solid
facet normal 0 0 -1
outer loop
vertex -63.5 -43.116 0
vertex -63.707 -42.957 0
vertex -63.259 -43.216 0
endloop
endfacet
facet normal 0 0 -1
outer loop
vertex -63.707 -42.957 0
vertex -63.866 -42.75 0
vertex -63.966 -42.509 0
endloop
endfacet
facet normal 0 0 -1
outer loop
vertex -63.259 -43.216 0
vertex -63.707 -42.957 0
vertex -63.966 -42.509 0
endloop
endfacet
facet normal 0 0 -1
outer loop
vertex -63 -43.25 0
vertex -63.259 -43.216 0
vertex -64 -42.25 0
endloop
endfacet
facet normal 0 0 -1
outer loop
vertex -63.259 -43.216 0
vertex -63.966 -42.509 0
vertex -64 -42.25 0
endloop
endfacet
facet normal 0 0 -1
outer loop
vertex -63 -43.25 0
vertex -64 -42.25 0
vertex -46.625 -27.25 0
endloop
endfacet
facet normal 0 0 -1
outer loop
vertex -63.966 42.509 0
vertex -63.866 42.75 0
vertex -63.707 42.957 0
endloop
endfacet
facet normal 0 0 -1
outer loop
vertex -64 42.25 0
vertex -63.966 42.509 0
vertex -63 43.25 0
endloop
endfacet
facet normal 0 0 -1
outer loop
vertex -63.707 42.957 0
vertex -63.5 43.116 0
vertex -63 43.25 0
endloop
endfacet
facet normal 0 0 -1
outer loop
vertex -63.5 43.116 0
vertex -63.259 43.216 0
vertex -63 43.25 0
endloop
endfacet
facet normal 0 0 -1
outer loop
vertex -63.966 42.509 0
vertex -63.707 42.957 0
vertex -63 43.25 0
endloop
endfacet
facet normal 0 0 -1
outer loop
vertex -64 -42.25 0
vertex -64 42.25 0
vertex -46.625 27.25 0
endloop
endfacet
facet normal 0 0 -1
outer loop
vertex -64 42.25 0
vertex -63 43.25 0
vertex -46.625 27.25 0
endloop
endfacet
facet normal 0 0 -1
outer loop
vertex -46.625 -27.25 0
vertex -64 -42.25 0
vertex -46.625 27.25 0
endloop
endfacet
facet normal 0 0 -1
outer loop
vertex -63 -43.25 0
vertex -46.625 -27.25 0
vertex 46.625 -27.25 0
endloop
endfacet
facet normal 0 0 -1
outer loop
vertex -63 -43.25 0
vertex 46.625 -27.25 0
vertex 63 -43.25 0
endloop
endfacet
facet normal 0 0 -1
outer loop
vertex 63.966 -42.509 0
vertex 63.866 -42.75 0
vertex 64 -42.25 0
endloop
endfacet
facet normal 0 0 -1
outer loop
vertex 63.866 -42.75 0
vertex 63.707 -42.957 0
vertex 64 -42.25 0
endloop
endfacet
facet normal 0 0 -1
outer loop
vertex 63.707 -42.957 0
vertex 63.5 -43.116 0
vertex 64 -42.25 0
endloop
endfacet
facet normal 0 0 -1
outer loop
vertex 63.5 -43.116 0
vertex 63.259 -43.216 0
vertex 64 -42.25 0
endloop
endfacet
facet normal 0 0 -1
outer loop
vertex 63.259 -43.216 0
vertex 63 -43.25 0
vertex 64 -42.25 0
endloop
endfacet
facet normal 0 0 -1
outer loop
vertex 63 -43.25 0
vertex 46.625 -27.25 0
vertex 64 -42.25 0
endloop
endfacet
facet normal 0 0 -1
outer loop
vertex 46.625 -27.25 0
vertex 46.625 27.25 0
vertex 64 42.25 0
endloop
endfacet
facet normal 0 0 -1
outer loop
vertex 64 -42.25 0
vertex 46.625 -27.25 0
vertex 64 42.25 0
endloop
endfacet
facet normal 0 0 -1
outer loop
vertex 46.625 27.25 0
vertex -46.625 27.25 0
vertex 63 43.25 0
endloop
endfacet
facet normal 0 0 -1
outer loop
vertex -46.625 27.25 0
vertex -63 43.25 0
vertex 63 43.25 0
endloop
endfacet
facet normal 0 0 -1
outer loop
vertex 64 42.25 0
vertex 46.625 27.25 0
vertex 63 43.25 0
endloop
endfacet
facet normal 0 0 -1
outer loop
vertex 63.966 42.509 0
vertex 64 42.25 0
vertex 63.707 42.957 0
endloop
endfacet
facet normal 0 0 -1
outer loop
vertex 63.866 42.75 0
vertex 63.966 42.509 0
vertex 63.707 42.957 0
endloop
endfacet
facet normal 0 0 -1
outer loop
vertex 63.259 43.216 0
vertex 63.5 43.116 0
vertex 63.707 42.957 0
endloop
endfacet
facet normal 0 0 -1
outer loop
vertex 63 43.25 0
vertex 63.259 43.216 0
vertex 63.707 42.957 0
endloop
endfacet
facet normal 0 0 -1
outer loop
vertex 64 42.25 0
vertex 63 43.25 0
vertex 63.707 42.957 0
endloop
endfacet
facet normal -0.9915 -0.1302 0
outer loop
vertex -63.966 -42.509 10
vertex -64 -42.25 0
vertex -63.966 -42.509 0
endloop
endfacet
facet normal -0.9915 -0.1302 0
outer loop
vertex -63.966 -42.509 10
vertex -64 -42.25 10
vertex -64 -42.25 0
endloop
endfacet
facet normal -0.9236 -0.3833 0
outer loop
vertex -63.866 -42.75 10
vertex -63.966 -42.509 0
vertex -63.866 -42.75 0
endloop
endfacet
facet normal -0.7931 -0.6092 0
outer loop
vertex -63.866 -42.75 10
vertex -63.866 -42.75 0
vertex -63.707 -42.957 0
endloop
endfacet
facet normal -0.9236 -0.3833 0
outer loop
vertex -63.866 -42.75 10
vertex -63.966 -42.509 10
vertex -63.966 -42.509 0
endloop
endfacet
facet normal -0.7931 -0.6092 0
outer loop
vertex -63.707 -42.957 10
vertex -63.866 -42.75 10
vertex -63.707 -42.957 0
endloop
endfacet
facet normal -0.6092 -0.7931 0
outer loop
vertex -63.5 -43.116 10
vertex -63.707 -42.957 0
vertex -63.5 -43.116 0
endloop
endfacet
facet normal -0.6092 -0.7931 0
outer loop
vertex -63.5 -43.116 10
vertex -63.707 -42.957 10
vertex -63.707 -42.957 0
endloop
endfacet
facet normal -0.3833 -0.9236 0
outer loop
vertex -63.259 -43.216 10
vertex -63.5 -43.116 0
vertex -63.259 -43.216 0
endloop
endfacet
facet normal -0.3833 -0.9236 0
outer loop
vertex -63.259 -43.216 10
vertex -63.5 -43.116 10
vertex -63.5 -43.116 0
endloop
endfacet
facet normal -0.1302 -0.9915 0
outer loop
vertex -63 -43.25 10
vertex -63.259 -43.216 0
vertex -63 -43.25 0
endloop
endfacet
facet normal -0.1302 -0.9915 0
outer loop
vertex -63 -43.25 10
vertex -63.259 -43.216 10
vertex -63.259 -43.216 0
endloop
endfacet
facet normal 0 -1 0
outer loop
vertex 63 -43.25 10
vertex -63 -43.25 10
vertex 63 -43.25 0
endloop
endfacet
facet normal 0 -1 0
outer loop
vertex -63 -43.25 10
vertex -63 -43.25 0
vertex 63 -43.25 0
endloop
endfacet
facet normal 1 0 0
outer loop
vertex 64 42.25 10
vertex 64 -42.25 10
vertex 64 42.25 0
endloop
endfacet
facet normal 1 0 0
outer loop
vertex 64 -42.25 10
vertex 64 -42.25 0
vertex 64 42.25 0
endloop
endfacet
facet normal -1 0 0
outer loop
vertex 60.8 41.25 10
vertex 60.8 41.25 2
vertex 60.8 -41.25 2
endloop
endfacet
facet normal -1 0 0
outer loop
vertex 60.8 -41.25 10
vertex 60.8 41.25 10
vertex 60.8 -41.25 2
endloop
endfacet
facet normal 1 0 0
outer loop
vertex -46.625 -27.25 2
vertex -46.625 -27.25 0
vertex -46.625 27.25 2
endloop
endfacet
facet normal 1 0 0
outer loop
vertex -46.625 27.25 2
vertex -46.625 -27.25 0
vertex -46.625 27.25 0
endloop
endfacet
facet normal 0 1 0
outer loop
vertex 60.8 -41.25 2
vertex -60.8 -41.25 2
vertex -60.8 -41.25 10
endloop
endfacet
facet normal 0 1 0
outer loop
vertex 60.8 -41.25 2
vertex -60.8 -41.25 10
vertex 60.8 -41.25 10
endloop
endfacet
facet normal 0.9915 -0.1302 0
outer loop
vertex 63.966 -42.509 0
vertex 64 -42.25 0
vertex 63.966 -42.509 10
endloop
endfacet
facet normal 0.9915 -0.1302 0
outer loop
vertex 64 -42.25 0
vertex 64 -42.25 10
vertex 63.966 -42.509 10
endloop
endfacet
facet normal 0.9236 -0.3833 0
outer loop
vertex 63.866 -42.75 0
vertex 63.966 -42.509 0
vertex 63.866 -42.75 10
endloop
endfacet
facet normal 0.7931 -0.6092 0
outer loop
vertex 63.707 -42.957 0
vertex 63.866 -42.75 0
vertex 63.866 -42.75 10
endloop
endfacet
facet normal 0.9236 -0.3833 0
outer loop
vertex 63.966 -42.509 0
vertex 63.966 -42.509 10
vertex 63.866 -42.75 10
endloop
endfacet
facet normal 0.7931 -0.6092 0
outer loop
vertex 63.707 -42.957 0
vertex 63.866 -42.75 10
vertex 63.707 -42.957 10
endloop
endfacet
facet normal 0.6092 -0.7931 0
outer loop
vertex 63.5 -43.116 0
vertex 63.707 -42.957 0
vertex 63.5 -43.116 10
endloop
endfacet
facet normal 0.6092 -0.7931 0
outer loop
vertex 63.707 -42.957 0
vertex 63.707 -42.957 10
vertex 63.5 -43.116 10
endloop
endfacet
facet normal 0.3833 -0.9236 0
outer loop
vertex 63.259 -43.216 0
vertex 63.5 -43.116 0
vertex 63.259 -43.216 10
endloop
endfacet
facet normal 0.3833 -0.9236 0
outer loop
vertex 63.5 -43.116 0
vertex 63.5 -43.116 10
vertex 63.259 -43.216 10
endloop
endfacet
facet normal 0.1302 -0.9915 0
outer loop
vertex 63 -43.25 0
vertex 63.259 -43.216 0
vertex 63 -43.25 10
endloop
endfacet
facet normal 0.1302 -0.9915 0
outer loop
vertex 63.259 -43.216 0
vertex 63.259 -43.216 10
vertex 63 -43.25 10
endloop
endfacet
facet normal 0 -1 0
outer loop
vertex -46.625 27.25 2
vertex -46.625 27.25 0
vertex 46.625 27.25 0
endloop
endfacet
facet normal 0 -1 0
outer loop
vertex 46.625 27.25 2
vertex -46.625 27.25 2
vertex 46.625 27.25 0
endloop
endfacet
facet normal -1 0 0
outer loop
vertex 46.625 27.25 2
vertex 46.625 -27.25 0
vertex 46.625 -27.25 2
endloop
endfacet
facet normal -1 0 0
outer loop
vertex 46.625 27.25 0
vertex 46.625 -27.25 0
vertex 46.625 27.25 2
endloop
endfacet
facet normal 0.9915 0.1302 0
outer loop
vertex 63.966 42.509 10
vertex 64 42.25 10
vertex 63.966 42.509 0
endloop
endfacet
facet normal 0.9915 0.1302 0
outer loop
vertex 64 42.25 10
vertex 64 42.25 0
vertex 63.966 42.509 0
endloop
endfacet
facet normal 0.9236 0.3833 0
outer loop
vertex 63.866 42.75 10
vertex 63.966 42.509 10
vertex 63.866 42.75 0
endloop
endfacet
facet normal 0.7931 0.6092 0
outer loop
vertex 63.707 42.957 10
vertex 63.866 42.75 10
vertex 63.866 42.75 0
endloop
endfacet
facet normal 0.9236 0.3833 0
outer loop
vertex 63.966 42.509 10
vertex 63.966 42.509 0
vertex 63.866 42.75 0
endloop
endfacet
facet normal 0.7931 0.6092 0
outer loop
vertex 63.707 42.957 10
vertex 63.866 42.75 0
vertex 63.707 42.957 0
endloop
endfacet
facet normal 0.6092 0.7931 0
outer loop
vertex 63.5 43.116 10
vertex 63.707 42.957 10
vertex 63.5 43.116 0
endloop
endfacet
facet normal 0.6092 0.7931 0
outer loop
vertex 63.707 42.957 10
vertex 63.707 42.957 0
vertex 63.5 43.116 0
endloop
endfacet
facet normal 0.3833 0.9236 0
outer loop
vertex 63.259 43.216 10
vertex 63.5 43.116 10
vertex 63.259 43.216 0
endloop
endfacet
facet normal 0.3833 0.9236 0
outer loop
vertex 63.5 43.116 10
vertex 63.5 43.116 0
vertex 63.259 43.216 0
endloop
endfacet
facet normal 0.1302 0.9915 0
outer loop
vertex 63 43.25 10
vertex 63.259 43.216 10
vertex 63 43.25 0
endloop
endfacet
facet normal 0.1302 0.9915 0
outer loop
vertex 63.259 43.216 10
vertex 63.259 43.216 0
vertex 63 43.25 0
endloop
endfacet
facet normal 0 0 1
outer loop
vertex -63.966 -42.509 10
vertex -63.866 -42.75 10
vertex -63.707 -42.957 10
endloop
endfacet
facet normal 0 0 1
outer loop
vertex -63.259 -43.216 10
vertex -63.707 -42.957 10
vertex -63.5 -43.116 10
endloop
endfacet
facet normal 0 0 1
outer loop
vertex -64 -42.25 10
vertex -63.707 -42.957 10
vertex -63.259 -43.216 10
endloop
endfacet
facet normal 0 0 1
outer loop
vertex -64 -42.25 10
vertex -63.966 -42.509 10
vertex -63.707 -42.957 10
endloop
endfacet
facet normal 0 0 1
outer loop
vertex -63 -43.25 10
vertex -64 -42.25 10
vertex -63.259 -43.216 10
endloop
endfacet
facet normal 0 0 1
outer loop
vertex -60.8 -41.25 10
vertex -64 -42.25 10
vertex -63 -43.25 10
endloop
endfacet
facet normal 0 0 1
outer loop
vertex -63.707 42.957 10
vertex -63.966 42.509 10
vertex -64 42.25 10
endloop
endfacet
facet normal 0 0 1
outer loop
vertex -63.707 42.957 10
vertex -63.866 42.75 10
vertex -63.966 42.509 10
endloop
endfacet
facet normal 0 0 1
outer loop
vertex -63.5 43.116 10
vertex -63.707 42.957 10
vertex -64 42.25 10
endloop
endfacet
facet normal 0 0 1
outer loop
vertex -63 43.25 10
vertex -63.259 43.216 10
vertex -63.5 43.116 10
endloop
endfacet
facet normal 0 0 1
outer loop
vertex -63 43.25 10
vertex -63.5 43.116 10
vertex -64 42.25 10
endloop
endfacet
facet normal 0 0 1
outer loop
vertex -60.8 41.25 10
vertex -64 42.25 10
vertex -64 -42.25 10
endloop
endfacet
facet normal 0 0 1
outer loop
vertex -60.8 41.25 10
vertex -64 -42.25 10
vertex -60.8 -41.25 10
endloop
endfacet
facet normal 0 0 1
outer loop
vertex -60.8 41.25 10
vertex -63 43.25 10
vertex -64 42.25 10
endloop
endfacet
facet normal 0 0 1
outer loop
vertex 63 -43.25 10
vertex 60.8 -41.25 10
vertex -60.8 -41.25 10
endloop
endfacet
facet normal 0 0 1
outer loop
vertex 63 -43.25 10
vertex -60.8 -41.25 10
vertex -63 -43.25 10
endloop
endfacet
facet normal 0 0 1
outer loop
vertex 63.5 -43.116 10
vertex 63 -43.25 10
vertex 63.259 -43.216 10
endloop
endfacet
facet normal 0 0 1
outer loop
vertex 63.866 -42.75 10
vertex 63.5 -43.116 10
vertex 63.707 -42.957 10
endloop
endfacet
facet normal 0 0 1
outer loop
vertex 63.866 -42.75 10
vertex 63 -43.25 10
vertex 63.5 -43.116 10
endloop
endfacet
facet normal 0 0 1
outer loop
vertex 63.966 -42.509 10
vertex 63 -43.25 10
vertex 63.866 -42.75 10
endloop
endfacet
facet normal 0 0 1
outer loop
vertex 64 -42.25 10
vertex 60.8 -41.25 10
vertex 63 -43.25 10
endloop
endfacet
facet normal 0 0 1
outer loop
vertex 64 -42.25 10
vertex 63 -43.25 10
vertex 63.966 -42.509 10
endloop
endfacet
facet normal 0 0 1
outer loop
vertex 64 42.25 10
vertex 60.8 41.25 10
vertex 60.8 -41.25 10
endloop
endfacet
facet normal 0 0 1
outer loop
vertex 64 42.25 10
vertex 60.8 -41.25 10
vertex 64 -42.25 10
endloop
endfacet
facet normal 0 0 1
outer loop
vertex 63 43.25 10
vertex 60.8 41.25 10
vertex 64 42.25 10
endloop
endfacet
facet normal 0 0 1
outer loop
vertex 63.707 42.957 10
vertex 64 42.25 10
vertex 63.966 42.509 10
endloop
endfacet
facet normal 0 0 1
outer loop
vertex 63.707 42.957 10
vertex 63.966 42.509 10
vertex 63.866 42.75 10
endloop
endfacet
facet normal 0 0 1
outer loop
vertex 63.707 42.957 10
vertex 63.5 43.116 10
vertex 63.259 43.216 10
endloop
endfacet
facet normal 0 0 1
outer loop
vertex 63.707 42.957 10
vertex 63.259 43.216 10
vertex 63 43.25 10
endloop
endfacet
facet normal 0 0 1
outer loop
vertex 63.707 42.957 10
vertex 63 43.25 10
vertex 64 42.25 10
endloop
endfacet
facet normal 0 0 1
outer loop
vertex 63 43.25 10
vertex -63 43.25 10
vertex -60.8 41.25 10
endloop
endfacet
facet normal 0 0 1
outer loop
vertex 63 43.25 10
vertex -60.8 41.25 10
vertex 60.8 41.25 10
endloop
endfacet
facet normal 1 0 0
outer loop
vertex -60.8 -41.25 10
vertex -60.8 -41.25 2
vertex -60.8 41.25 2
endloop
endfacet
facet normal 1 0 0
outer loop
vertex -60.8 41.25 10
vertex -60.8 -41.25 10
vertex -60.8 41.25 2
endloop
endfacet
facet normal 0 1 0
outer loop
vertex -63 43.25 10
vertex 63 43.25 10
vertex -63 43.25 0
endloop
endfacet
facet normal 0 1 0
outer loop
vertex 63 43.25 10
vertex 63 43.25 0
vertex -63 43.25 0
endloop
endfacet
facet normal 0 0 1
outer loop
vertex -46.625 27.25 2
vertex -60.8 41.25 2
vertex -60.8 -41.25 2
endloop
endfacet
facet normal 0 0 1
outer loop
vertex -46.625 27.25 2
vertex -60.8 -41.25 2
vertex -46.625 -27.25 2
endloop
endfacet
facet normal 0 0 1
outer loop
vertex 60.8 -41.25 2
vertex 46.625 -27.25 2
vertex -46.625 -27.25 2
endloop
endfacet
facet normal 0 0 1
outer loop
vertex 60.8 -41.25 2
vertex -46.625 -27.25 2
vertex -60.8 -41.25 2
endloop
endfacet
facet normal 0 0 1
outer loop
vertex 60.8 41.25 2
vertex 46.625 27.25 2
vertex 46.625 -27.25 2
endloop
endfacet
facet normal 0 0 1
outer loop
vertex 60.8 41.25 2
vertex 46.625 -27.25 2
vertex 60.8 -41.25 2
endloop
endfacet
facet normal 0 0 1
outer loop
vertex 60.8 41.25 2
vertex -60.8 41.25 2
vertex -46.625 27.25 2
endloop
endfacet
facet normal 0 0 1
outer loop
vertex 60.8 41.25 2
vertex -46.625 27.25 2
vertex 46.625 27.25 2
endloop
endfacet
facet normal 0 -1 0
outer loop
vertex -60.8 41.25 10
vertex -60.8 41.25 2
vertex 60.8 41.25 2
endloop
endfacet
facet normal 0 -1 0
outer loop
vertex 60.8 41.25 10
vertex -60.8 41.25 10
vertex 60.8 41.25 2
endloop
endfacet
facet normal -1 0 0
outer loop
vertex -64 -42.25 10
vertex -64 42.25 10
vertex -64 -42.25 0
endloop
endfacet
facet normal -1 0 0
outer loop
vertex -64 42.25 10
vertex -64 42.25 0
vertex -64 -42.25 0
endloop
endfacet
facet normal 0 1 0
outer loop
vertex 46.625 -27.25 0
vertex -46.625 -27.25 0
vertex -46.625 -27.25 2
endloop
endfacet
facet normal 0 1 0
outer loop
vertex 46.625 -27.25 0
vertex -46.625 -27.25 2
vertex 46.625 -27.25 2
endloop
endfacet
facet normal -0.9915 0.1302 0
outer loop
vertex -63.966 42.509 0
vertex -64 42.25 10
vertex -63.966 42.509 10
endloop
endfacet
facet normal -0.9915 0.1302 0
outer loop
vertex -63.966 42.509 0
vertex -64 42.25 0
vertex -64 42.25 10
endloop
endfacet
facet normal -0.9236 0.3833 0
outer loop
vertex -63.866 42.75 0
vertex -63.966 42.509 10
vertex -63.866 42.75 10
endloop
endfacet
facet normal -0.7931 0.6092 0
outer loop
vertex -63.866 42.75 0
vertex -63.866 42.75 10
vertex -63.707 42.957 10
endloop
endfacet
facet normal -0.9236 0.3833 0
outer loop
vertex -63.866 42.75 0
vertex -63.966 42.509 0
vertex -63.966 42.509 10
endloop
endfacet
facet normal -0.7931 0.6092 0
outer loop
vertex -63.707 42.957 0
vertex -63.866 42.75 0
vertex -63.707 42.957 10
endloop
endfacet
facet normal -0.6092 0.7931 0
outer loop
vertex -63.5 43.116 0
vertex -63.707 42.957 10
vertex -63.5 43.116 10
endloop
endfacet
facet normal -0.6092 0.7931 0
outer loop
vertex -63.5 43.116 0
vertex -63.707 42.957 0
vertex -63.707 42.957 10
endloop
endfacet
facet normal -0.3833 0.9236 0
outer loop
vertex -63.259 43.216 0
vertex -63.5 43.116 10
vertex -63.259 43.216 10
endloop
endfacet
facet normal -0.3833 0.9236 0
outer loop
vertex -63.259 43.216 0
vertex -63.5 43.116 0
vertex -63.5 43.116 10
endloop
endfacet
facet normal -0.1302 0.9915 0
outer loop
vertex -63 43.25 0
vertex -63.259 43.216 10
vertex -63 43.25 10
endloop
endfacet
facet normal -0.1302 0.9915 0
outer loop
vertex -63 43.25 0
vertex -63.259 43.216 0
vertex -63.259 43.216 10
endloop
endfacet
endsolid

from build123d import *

# Parameters (mm, degrees)
F0_W     = 128
F0_H     = 86.5
F0_W_2   = 93.25
F0_H_2   = 54.5
F1_DEPTH = 2
F2_W     = 3.2
F2_H     = 82.5
F2_H_2   = 2
F2_W_2   = 121.6
F3_DEPTH = 8
F4_R     = 1


with BuildPart() as f1:
    # F0 (on Top) → F1 (new body)
    with BuildSketch(Plane.XY):
        Rectangle(F0_W, F0_H)
        Rectangle(F0_W_2, F0_H_2, mode=Mode.SUBTRACT)
    extrude(amount=F1_DEPTH)

    # F2 (on face) → F3 (join)
    with BuildSketch(Plane.XY.offset(2)):
        with Locations((-62.4, 0)):
            Rectangle(F2_W, F2_H)
        with Locations((-62.4, 42.25)):
            Rectangle(F2_W, F2_H_2)
        with Locations((0, 42.25)):
            Rectangle(F2_W_2, F2_H_2)
        with Locations((62.4, 42.25)):
            Rectangle(F2_W, F2_H_2)
        with Locations((62.4, 0)):
            Rectangle(F2_W, F2_H)
        with Locations((62.4, -42.25)):
            Rectangle(F2_W, F2_H_2)
        with Locations((0, -42.25)):
            Rectangle(F2_W_2, F2_H_2)
        with Locations((-62.4, -42.25)):
            Rectangle(F2_W, F2_H_2)
    extrude(amount=F3_DEPTH)

    # F4
    f4_edges = [f1.edges().sort_by_distance(p)[0] for p in [
        (-64, -43.25, 5),
        (-64, 43.25, 5),
        (64, -43.25, 5),
        (64, 43.25, 5),
    ]]
    fillet(f4_edges, radius=F4_R)


solid = f1.part
